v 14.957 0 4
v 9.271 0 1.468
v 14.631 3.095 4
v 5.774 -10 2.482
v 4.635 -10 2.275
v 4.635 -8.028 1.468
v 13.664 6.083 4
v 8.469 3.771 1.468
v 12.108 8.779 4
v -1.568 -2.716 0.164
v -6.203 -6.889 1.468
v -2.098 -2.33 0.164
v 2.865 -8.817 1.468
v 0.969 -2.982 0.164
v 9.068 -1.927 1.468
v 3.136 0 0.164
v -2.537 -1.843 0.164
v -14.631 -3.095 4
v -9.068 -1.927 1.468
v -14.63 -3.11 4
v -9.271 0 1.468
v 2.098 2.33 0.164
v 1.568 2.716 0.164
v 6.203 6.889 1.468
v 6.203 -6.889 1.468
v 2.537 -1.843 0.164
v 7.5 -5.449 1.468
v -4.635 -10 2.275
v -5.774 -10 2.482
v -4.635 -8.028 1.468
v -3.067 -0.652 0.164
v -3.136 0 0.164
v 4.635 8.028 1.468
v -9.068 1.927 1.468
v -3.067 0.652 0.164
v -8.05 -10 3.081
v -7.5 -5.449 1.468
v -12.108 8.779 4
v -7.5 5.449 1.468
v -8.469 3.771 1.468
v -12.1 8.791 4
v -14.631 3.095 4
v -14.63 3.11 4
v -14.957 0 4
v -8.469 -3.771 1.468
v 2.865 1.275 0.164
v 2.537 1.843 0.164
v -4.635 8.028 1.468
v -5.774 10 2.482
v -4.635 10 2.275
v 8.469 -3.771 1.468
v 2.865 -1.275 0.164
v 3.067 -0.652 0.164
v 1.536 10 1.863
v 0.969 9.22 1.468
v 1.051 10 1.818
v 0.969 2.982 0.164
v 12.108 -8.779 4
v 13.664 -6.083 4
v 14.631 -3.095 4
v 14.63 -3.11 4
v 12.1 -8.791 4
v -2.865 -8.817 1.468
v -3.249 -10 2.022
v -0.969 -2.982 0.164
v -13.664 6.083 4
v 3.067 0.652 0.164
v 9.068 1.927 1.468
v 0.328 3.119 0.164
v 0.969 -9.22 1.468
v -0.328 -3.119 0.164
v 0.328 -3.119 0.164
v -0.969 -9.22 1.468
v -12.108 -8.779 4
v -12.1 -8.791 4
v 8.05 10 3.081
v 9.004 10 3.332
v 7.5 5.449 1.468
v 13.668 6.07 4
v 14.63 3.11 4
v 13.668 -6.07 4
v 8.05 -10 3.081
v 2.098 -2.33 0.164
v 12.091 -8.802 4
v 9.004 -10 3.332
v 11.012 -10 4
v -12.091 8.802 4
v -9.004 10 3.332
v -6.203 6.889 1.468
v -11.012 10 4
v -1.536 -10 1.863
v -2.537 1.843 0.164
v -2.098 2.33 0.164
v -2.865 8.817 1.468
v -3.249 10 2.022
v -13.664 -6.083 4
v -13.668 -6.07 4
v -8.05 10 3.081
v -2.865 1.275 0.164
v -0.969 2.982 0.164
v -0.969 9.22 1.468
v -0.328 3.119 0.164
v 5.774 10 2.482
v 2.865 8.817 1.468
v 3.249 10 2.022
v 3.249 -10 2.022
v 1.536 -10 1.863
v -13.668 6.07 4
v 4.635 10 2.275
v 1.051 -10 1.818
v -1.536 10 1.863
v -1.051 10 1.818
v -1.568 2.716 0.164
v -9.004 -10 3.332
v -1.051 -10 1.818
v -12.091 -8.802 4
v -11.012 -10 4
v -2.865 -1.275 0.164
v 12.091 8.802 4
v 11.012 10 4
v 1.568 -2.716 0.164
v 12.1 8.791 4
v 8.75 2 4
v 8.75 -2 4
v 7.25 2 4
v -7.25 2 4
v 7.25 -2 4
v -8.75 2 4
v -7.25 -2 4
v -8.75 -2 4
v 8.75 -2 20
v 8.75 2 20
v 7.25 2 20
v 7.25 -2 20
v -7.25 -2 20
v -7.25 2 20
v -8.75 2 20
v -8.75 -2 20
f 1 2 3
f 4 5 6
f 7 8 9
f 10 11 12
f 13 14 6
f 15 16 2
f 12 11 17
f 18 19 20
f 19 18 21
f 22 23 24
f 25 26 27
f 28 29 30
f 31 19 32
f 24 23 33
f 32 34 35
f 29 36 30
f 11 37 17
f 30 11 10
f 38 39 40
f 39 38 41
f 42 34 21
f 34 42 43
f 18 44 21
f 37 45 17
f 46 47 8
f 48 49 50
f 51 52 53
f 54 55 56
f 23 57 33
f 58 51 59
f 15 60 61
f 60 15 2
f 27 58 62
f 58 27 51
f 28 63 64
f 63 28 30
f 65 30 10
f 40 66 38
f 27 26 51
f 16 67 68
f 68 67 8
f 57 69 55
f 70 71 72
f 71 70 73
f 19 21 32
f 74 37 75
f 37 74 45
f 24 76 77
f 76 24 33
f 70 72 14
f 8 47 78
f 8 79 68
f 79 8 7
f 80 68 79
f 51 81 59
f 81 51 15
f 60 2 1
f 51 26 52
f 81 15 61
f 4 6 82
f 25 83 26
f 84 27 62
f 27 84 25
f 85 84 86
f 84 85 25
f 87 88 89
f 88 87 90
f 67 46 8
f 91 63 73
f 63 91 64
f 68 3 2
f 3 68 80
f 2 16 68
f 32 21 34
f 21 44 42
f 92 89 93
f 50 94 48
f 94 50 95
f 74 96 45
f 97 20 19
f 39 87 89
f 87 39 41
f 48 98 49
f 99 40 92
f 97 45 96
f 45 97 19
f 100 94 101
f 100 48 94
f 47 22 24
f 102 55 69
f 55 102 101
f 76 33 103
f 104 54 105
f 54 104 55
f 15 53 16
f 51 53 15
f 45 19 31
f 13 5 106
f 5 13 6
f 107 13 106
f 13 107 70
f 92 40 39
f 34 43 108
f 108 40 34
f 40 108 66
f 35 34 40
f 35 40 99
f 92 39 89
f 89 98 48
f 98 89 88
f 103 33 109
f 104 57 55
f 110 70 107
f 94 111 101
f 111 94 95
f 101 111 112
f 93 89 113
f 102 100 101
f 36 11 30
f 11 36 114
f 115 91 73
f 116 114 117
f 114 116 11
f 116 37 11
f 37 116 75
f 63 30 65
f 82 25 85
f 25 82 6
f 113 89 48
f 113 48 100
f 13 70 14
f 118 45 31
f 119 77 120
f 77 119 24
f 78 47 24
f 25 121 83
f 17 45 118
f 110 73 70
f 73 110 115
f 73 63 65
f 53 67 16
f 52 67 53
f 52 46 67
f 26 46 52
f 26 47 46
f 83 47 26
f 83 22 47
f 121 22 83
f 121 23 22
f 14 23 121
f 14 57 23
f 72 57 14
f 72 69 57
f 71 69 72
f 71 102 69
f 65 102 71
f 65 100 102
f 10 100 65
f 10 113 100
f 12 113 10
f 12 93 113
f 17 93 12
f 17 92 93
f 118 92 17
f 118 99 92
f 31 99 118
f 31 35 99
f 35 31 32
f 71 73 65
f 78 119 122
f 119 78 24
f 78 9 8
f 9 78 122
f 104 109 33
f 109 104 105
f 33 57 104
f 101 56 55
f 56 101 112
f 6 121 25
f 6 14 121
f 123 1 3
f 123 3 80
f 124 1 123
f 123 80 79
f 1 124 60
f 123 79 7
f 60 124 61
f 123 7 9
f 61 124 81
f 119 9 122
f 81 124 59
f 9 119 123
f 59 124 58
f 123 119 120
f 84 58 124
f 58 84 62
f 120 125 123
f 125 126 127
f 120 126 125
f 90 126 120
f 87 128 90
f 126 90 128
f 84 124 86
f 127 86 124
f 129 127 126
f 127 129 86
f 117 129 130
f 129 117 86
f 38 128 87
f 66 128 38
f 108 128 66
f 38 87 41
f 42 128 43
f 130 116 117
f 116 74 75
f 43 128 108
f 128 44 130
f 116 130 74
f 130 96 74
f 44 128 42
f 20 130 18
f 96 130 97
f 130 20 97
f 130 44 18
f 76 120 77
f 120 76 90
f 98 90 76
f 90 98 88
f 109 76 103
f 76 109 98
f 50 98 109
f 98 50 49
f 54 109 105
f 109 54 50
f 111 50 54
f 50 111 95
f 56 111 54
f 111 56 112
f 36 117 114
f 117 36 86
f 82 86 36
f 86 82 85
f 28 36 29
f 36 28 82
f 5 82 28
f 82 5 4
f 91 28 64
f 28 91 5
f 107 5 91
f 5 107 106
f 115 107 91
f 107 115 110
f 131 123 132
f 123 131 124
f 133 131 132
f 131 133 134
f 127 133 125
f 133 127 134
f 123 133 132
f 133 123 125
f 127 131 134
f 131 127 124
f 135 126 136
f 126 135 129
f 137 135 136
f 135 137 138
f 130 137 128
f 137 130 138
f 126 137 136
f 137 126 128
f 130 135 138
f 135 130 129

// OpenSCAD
COVER_RADIUS = 30;
COVER_WIDTH = 30;
COVER_LENGTH = 20;
COVER_THICKNESS = 4;

PIN_THICKNESS = 1.5;
PIN_WIDTH = 4;
PIN_LENGTH = 16;
PIN_SPACING = 16;

module pin() {
	translate([0,0,PIN_LENGTH / 2]) cube([PIN_THICKNESS,PIN_WIDTH,PIN_LENGTH], center = true);
}

difference() {
	translate([0,0,COVER_RADIUS]) sphere(COVER_RADIUS);
	translate([0,0,50 + COVER_THICKNESS]) cube(100, center = true);
	translate([0,50 + COVER_LENGTH / 2,0]) cube(100, center = true);
	translate([0, -50 - COVER_LENGTH / 2,0]) cube(100, center = true);
	translate([50 + COVER_WIDTH / 2,0,0]) cube(100, center = true);
	translate([-50 - COVER_WIDTH / 2,0,0]) cube(100, center = true);
}

translate([PIN_SPACING / 2,0,COVER_THICKNESS]) pin();
translate([-PIN_SPACING / 2,0,COVER_THICKNESS]) pin();
